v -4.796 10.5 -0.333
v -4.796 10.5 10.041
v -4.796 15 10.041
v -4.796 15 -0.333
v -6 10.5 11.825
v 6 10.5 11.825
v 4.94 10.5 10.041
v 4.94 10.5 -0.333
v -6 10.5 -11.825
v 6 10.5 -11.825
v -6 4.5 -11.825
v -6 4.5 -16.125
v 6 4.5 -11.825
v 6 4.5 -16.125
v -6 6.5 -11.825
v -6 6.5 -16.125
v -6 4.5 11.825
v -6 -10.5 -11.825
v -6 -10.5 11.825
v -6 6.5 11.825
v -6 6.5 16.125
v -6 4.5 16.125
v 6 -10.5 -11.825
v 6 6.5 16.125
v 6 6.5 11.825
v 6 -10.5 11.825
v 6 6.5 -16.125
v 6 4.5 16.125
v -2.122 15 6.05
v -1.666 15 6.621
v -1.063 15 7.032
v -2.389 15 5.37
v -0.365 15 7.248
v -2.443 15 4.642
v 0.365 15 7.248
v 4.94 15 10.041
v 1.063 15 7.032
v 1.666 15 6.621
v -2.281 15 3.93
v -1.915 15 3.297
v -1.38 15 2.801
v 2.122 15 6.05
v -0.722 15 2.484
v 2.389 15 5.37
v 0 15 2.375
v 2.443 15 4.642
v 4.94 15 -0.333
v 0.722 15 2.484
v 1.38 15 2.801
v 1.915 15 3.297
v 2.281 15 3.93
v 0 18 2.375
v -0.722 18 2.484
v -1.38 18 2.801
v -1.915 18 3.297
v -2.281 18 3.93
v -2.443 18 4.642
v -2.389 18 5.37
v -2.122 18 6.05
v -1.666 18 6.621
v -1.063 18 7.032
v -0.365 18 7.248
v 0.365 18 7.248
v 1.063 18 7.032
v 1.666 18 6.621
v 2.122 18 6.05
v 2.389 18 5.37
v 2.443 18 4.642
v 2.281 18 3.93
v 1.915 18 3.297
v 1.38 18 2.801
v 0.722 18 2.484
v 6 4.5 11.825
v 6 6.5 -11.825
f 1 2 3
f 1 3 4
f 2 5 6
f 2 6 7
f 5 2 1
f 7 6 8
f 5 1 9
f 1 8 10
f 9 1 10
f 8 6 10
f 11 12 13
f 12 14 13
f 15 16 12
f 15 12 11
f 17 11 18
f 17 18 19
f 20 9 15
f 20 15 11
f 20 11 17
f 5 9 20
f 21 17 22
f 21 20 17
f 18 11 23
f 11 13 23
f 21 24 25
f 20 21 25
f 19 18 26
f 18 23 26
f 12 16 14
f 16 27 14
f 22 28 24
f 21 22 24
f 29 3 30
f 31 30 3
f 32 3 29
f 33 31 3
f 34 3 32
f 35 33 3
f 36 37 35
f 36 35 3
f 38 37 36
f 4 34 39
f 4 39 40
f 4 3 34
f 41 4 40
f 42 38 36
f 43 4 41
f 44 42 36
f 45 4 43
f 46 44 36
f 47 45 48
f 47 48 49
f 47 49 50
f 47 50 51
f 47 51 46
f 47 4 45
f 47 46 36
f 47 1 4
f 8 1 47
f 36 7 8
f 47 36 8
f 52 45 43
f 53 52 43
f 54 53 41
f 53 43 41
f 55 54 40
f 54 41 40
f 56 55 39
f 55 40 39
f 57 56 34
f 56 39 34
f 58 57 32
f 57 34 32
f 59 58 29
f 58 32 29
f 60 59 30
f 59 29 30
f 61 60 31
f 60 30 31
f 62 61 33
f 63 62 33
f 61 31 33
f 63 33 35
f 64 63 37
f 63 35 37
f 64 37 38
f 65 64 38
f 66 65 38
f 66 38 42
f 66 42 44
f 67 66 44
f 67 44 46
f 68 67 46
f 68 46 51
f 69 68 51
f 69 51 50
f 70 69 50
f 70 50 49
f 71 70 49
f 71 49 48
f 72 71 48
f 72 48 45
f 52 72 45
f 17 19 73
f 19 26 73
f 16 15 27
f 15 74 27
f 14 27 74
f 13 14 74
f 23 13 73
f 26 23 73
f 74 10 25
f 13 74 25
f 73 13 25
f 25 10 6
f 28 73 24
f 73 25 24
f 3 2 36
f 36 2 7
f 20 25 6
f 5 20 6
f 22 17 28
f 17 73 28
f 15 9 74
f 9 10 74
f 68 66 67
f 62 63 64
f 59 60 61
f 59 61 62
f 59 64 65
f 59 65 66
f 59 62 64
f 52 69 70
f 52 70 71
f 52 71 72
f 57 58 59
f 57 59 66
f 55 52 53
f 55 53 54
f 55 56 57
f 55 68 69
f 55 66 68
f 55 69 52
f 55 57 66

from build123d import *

# Parameters (mm, degrees)
BOSS_EXTRUDE1_DEPTH = 6
BOSS_EXTRUDE2_START = -4
SKETCH2_W           = 9.735530135
SKETCH2_H           = 10.374223994
BOSS_EXTRUDE2_DEPTH = 8.5
SKETCH3_R           = 2.45
BOSS_EXTRUDE3_DEPTH = 7.5


with BuildPart() as part:
    # Sketch1 → Boss-Extrude1 (new, symmetric)
    with BuildSketch(Plane(origin=(0, 0, 0), x_dir=(0, 0, -1), z_dir=(1, 0, 0))):
        Polygon((-11.825, 6.5), (-11.825, 10.5), (11.825, 10.5), (11.825, 6.5), (16.125, 6.5), (16.125, 4.5), (11.825, 4.5), (11.825, -10.5), (-11.825, -10.5), (-11.825, 4.5), (-16.125, 4.5), (-16.125, 6.5), align=None)
    extrude(amount=BOSS_EXTRUDE1_DEPTH, both=True)

    # Sketch2 → Boss-Extrude2 (add)
    with BuildSketch(Plane(origin=(0, 10.5, 0), x_dir=(1, 0, 0), z_dir=(0, 1, 0)).offset(BOSS_EXTRUDE2_START)):
        with Locations((0.07225674, -4.853907597)):
            Rectangle(SKETCH2_W, SKETCH2_H)
    extrude(amount=BOSS_EXTRUDE2_DEPTH)

    # Sketch3 → Boss-Extrude3 (add)
    with BuildSketch(Plane(origin=(0, 10.5, 0), x_dir=(1, 0, 0), z_dir=(0, 1, 0))):
        with Locations(Location((0, -4.825, 0), (0, 0, 90))):
            Circle(SKETCH3_R)
    extrude(amount=BOSS_EXTRUDE3_DEPTH)


solid = part.part
